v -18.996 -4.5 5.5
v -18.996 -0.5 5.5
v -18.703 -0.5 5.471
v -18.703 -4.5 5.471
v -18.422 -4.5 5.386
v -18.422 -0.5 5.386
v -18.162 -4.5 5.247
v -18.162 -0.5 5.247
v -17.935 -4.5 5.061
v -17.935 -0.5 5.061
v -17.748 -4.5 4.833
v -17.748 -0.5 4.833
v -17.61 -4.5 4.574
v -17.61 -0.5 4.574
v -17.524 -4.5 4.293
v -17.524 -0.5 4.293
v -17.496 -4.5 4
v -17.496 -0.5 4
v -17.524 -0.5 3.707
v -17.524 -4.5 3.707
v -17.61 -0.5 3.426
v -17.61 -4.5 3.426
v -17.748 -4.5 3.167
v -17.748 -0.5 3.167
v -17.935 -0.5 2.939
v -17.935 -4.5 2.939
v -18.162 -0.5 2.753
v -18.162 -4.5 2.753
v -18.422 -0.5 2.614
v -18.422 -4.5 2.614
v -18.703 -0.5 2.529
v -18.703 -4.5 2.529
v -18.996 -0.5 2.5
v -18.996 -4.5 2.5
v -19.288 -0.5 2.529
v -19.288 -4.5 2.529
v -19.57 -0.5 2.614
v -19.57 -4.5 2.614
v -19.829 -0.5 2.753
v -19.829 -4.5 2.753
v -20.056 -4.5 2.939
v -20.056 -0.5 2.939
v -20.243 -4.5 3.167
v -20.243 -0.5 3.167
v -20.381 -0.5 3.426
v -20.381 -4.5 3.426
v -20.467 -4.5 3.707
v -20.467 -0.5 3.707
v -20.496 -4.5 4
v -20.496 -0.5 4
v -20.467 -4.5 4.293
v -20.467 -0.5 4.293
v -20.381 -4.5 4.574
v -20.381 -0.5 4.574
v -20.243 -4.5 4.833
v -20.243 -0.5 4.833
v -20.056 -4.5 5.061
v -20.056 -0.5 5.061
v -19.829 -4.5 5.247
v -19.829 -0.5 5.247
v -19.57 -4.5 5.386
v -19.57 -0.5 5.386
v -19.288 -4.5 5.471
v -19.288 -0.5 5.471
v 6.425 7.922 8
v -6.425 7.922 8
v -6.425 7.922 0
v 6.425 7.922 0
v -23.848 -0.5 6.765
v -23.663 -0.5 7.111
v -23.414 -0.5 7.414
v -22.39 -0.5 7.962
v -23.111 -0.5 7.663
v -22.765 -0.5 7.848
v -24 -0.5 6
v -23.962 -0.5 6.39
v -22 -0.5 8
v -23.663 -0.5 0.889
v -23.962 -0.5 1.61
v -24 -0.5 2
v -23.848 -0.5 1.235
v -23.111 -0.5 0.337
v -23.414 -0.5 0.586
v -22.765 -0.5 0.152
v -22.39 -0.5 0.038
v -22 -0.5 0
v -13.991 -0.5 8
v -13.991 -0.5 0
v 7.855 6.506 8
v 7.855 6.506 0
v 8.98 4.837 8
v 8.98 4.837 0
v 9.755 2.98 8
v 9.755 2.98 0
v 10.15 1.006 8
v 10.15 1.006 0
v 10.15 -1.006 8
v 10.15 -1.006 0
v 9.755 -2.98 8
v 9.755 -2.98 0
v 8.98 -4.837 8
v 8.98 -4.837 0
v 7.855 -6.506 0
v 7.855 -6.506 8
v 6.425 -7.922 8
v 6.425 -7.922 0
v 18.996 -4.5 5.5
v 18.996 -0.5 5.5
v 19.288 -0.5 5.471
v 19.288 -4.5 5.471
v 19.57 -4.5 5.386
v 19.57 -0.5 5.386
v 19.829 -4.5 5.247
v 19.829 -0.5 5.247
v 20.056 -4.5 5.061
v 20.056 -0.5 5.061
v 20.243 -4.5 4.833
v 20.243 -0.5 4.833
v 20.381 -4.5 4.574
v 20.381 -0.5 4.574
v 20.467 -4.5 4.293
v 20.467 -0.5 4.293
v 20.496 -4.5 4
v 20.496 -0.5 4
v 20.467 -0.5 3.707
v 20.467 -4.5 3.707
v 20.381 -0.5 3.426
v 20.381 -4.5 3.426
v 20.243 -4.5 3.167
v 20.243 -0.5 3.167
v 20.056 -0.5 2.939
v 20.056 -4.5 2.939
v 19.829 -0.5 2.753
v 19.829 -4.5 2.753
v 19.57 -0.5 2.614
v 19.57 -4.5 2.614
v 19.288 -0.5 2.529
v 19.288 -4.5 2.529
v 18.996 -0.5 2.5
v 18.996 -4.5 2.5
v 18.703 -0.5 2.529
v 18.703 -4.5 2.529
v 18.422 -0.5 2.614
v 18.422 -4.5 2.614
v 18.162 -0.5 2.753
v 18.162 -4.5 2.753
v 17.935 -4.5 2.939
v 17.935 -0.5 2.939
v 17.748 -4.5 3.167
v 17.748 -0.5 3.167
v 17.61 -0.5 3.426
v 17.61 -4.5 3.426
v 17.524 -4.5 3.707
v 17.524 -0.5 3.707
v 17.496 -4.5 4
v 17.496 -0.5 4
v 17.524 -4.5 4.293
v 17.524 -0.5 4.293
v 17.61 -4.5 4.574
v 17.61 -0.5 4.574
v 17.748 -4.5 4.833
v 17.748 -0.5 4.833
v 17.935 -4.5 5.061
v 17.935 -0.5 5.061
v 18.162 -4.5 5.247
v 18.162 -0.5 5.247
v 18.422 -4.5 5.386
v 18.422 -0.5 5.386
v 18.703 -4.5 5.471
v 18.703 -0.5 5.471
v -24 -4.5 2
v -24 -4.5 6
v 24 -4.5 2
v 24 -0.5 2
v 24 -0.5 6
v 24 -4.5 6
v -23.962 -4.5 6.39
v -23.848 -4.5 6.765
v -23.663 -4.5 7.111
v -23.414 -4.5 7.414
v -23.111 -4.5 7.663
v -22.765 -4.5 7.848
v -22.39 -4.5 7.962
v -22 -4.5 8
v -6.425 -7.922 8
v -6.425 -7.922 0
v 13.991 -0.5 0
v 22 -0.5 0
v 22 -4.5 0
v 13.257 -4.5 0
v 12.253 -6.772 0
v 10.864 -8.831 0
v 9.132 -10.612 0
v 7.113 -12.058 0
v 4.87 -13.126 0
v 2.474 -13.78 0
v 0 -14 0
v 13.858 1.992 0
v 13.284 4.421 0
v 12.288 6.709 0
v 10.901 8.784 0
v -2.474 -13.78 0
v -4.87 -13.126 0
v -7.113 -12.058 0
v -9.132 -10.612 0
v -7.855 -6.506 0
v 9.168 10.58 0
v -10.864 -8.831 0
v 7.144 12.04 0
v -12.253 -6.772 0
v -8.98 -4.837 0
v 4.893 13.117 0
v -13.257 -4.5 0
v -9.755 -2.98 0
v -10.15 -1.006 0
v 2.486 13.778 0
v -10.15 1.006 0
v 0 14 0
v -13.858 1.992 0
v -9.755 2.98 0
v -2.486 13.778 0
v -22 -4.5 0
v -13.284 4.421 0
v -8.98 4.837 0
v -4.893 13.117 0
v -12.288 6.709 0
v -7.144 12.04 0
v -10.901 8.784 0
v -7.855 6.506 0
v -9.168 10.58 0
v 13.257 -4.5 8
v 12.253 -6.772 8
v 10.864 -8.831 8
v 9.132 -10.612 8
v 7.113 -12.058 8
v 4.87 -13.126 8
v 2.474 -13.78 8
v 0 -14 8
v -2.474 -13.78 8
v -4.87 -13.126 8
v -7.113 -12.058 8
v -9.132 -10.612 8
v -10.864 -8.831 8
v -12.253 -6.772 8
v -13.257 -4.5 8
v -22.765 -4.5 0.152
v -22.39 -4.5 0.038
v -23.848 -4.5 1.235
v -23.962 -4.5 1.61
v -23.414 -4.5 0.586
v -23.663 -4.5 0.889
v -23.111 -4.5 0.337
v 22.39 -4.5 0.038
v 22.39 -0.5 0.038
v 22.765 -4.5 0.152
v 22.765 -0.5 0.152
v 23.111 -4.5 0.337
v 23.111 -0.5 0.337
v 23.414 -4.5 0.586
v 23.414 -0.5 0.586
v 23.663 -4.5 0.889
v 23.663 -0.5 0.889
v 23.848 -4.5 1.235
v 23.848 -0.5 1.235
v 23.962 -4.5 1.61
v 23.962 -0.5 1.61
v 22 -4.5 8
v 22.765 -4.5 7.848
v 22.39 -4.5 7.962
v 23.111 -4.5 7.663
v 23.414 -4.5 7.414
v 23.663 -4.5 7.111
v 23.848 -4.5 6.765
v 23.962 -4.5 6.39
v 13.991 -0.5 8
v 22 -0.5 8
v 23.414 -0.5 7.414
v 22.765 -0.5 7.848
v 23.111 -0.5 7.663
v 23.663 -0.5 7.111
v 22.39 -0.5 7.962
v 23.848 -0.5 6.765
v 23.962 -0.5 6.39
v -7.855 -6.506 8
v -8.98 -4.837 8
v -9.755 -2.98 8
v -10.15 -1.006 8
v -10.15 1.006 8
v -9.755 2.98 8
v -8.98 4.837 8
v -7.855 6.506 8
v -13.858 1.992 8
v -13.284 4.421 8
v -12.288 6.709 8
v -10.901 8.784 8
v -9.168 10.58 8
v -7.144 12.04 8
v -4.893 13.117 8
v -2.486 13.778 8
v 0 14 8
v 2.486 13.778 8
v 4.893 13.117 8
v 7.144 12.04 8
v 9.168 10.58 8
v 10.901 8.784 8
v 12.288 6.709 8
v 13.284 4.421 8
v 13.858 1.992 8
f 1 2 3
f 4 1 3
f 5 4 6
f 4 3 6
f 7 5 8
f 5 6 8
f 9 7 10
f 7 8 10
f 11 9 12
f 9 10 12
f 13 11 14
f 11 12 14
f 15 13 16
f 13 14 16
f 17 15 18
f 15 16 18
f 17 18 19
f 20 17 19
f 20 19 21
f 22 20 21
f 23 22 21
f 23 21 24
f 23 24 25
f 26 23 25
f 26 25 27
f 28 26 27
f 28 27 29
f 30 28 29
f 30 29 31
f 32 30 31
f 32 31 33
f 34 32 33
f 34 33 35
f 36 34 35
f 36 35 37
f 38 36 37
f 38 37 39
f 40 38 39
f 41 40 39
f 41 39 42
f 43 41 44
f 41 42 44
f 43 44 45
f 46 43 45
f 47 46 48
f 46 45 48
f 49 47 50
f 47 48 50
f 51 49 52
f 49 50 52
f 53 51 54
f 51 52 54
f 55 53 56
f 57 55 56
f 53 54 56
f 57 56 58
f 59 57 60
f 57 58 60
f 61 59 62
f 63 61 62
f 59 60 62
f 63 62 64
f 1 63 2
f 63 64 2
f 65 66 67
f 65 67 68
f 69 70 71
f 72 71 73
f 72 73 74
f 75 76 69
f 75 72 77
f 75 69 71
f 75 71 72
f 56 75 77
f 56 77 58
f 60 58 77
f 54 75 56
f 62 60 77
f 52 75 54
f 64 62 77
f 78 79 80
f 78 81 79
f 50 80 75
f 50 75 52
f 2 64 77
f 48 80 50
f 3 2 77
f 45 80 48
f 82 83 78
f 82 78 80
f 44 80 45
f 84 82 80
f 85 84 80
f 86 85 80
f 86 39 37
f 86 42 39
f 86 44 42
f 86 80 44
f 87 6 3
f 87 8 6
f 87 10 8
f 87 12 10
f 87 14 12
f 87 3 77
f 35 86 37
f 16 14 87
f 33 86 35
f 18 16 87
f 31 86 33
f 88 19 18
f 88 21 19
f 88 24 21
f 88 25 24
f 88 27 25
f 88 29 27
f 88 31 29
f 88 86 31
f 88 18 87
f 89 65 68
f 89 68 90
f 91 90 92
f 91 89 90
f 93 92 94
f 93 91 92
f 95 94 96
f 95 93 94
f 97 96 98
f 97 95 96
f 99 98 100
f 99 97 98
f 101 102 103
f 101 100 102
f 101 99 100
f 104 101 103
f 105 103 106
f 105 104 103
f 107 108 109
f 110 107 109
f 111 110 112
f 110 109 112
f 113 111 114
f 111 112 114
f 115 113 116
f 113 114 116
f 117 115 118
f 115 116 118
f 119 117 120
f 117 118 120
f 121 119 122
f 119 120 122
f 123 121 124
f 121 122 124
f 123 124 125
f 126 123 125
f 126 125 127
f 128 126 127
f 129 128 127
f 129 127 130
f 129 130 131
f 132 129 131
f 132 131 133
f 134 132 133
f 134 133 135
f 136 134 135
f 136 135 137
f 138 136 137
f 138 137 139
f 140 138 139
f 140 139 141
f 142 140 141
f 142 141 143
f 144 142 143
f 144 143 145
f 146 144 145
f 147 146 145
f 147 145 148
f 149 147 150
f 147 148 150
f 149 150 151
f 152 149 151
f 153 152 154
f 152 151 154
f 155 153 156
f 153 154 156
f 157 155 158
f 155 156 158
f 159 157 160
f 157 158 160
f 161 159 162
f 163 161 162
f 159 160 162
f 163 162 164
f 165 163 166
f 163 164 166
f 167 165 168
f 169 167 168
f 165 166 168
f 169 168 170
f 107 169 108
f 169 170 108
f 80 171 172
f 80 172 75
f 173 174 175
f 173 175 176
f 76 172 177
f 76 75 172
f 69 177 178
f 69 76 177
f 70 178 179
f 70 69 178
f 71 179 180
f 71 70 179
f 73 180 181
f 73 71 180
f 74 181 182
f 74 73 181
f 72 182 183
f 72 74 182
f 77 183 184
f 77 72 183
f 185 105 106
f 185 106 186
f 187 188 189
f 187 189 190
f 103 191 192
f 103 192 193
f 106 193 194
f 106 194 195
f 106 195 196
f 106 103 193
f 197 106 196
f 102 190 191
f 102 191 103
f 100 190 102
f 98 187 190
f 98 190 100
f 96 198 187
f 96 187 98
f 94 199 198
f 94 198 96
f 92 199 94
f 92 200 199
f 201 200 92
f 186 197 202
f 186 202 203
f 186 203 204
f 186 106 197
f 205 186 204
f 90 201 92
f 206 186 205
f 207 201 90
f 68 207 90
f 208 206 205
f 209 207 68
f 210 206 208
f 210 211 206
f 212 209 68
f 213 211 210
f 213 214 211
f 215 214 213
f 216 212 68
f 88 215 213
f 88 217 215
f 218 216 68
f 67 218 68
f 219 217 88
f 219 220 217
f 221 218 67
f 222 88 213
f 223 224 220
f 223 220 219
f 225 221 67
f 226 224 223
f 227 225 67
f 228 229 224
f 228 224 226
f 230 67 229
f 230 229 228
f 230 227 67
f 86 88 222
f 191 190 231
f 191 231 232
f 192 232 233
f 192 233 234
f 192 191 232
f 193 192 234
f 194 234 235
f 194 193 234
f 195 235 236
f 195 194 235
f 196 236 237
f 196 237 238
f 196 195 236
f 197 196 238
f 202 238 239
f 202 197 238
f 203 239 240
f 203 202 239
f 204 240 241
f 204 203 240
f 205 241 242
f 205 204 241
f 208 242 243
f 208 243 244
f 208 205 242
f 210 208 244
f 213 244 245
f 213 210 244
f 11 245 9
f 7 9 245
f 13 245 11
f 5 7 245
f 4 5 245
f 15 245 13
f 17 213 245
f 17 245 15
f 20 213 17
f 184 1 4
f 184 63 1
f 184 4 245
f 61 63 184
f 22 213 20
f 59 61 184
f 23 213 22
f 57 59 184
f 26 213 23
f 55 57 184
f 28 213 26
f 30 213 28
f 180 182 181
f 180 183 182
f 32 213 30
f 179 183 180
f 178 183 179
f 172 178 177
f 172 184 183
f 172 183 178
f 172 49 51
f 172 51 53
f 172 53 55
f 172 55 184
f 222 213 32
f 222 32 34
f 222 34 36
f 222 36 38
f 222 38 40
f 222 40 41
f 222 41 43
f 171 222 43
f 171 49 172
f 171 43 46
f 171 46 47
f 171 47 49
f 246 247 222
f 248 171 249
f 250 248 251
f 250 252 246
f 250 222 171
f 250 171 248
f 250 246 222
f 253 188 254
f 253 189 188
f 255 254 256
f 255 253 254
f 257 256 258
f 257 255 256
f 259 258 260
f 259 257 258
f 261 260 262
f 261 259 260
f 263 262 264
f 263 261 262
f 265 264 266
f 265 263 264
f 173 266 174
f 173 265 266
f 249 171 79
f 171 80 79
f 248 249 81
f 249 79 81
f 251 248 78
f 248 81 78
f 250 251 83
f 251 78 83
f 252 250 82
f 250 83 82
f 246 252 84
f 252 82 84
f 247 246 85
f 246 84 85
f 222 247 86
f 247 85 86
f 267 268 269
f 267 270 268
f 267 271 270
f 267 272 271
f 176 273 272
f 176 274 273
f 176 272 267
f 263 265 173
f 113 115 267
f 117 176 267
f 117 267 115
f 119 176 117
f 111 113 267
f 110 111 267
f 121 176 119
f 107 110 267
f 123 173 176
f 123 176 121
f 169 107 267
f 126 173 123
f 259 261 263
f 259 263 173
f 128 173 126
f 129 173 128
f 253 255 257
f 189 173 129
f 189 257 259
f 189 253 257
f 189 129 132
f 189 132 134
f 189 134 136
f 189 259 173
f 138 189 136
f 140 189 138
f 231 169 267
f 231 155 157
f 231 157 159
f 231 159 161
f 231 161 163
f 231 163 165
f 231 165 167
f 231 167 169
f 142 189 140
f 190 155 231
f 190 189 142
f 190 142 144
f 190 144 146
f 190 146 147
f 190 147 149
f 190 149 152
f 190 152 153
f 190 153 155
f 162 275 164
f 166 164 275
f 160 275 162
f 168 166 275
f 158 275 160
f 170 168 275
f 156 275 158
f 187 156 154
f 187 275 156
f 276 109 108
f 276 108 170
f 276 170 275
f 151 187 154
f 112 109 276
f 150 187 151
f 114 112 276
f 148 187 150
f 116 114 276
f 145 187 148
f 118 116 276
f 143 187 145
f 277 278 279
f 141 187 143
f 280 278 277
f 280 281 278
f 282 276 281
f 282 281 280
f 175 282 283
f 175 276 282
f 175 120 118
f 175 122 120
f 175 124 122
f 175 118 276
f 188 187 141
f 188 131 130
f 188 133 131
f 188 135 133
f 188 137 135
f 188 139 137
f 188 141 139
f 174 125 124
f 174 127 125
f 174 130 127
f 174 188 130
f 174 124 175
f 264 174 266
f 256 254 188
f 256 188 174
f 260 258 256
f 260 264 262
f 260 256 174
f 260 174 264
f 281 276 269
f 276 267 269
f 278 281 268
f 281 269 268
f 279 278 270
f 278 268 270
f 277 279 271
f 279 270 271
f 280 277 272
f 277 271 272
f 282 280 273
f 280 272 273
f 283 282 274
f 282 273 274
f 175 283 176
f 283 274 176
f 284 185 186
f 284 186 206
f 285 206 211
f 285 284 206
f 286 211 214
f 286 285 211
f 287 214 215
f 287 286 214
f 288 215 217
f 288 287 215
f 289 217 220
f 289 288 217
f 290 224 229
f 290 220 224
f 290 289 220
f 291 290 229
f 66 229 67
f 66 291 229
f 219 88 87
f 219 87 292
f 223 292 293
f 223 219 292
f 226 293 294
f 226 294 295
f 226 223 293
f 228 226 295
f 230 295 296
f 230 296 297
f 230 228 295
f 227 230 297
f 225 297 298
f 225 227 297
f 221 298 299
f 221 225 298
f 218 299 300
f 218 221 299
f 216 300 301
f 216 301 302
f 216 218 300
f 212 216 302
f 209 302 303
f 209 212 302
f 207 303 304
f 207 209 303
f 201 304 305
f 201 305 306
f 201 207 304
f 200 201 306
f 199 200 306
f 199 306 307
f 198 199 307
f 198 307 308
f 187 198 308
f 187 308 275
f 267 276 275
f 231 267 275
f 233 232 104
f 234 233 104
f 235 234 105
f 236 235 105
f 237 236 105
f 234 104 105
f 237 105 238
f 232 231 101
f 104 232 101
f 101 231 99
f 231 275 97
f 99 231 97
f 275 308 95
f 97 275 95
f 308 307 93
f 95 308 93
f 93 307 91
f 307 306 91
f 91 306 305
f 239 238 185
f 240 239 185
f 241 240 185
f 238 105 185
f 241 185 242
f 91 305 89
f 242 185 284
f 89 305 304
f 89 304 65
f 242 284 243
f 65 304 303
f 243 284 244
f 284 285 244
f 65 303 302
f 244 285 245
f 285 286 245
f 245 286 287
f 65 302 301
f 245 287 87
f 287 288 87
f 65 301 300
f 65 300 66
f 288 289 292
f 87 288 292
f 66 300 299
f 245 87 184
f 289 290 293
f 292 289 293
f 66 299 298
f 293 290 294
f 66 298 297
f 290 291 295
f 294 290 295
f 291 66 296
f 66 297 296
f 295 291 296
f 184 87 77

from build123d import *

# Parameters (mm, degrees)
SALIENTE_EXTRUIR1_DEPTH = 8
CORTAR_EXTRUIR1_DEPTH   = 29.91366459
CROQUIS3_R              = 1.5
CORTAR_EXTRUIR2_DEPTH   = 5
REDONDEO1_R             = 2


with BuildPart() as part:
    # Croquis1 → Saliente-Extruir1 (new body)
    with BuildSketch(Plane.XY):
        with BuildLine():
            Line((-24, -0.5), (-13.99106858, -0.5))
            ThreePointArc((-13.99106858, -0.5), (0, 14), (13.99106858, -0.5))
            Line((13.99106858, -0.5), (24, -0.5))
            Line((24, -0.5), (24, -4.5))
            Line((24, -4.5), (13.257073584, -4.5))
            ThreePointArc((13.257073584, -4.5), (0, -14), (-13.257073584, -4.5))
            Line((-13.257073584, -4.5), (-24, -4.5))
            Line((-24, -4.5), (-24, -0.5))
        make_face()
    extrude(amount=SALIENTE_EXTRUIR1_DEPTH)

    # Croquis2 → Cortar-Extruir1 (cut, through all)
    with BuildSketch(Plane.XY.offset(8)):
        with BuildLine():
            Line((-6.425, 7.922081482), (6.425, 7.922081482))
            ThreePointArc((6.425, 7.922081482), (10.2, 0), (6.425, -7.922081482))
            Line((6.425, -7.922081482), (-6.425, -7.922081482))
            ThreePointArc((-6.425, -7.922081482), (-10.2, 0), (-6.425, 7.922081482))
        make_face()
    extrude(amount=-CORTAR_EXTRUIR1_DEPTH, mode=Mode.SUBTRACT)

    # Croquis3 → Cortar-Extruir2 (cut)
    with BuildSketch(Plane(origin=(0, -0.5, 0), x_dir=(1, 0, 0), z_dir=(0, 1, 0))):
        with Locations(Location((18.99553429, -4, 0), (0, 0, 270))):
            Circle(CROQUIS3_R)
        with Locations(Location((-18.99553429, -4, 0), (0, 0, 270))):
            Circle(CROQUIS3_R)
    extrude(amount=-CORTAR_EXTRUIR2_DEPTH, mode=Mode.SUBTRACT)

    # Redondeo1
    redondeo1_edges = [part.edges().sort_by_distance(p)[0] for p in [
        (-24, -2.5, 8),
        (24, -2.5, 8),
        (24, -2.5, 0),
        (-24, -2.5, 0),
    ]]
    fillet(redondeo1_edges, radius=REDONDEO1_R)


solid = part.part
